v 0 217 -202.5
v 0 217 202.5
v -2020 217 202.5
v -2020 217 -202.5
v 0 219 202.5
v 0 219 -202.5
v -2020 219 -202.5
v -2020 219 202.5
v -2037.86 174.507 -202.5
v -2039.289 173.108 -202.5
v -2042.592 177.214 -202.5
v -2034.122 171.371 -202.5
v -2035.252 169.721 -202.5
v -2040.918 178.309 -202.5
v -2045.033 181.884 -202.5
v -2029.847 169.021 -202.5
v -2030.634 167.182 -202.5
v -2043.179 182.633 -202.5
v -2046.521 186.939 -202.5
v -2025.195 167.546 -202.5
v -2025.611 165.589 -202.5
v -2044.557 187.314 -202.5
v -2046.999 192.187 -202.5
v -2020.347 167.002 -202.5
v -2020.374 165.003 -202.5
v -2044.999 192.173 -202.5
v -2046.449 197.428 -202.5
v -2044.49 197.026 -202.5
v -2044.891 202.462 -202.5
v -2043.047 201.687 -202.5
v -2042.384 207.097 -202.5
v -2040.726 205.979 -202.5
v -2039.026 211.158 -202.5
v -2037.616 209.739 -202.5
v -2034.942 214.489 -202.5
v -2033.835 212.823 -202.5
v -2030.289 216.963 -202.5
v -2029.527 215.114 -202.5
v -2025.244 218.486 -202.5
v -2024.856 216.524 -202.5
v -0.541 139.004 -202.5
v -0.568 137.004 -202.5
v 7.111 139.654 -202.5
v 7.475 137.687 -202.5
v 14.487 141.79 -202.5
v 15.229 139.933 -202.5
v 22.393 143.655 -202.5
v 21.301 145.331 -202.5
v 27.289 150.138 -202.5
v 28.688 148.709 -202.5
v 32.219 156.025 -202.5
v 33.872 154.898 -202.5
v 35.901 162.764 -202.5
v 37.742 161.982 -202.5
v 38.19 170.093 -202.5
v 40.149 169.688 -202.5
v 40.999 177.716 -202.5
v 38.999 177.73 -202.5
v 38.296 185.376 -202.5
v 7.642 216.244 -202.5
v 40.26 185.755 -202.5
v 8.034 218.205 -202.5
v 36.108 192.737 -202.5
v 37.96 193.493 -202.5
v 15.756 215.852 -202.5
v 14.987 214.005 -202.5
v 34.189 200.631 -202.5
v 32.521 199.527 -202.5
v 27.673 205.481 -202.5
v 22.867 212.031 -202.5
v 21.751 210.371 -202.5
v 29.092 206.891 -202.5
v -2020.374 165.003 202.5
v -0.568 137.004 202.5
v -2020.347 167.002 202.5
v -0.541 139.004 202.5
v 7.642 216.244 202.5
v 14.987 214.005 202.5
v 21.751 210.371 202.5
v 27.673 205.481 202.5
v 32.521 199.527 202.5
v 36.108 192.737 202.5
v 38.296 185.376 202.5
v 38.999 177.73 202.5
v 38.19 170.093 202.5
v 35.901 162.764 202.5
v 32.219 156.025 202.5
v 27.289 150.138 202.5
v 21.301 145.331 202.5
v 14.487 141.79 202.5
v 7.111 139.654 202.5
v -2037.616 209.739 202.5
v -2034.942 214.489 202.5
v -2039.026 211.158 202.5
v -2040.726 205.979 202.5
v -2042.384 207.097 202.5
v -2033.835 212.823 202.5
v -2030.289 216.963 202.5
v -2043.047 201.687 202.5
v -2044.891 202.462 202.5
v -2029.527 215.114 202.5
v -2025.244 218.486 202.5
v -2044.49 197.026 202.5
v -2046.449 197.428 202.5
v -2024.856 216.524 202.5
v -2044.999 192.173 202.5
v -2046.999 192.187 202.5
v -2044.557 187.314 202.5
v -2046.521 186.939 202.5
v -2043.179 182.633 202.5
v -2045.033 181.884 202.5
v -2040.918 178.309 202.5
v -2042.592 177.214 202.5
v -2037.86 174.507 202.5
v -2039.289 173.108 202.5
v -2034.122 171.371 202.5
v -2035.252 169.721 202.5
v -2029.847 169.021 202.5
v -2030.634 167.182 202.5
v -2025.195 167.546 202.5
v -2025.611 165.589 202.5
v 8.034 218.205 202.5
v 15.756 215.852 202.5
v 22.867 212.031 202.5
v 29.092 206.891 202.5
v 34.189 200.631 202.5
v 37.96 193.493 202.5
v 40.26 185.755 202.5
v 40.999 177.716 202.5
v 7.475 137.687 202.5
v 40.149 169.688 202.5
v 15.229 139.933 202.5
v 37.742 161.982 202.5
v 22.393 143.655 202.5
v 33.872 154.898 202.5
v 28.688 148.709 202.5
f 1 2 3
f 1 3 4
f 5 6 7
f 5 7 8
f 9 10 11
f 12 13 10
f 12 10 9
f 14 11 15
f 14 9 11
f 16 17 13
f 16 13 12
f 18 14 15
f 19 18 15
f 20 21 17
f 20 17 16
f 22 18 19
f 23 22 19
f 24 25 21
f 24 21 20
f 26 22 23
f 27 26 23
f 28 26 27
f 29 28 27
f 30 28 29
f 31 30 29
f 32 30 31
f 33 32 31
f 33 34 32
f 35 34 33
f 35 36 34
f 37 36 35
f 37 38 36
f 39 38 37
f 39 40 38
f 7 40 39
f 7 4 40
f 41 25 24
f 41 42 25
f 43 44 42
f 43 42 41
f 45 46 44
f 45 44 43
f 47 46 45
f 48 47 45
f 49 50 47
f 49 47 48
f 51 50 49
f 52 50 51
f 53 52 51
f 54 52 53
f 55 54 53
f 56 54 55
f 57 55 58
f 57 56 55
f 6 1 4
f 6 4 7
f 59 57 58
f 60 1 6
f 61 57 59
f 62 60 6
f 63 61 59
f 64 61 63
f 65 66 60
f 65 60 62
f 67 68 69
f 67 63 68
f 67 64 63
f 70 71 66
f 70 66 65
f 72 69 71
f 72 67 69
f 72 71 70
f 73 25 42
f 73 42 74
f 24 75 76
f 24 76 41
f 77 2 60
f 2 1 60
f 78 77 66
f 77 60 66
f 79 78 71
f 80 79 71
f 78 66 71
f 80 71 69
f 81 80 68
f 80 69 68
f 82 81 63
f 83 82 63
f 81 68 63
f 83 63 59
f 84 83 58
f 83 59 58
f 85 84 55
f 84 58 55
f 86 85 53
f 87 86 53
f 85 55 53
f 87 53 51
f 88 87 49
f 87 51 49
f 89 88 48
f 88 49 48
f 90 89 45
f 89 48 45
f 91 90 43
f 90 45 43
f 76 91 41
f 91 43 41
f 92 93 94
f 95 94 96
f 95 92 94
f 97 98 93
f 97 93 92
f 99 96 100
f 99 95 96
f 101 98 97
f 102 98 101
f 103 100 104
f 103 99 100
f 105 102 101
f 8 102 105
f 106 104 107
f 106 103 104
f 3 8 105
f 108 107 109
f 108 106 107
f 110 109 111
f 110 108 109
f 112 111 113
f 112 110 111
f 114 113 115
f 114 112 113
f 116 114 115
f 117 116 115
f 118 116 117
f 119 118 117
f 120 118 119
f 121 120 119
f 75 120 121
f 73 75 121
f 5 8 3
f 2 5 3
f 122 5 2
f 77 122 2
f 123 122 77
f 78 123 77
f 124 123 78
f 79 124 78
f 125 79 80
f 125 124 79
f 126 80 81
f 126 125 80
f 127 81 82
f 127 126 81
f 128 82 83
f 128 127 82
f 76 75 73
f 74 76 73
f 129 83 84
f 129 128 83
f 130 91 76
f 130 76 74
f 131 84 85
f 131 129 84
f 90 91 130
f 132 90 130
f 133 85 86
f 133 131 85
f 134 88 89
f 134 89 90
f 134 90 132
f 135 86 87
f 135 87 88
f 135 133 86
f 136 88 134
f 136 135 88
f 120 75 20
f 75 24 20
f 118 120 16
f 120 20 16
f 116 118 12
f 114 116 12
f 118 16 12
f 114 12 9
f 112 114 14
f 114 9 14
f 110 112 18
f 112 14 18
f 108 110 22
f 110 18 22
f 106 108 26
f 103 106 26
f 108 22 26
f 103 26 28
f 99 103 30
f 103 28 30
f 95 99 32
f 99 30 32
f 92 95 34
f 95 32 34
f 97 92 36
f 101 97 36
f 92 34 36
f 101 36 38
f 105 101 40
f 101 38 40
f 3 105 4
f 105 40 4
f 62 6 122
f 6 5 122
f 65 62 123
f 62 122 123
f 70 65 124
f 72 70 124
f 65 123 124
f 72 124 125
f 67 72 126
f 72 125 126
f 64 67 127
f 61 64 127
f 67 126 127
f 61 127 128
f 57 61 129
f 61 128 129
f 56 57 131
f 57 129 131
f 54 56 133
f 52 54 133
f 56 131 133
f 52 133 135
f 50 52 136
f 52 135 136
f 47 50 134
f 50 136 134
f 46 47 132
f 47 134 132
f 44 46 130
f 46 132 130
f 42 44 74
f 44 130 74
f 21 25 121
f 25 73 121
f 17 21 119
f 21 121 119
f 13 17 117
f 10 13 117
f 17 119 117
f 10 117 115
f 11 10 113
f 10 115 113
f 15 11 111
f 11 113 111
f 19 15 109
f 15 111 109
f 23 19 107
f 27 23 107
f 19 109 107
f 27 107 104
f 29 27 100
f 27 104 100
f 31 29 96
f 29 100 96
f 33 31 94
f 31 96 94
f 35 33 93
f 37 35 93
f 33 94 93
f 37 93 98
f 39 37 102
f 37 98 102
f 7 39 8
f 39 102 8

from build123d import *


with BuildPart() as part:
    # Austragung1: sweep along a path in Skizze2
    with BuildLine(Plane.XY) as austragung1_path:
        Line((-2020, 217), (0, 217))
        ThreePointArc((0, 217), (38.99906336, 177.729709462), (-0.540568093, 139.003746512))
        Line((-0.540568093, 139.003746512), (-2020.346518009, 167.00240161))
        ThreePointArc((-2020.346518009, 167.00240161), (-2044.99939959, 192.173263165), (-2020, 217))
    # Skizze3 → Austragung1 (sweep)
    with BuildSketch(Plane(origin=(0, 0, 0), x_dir=(0, 0, -1), z_dir=(1, 0, 0))):
        Polygon((202.5, 219), (-202.5, 219), (-202.5, 217), (0, 217), (202.5, 217), align=None)
    sweep(path=austragung1_path.line)


solid = part.part
